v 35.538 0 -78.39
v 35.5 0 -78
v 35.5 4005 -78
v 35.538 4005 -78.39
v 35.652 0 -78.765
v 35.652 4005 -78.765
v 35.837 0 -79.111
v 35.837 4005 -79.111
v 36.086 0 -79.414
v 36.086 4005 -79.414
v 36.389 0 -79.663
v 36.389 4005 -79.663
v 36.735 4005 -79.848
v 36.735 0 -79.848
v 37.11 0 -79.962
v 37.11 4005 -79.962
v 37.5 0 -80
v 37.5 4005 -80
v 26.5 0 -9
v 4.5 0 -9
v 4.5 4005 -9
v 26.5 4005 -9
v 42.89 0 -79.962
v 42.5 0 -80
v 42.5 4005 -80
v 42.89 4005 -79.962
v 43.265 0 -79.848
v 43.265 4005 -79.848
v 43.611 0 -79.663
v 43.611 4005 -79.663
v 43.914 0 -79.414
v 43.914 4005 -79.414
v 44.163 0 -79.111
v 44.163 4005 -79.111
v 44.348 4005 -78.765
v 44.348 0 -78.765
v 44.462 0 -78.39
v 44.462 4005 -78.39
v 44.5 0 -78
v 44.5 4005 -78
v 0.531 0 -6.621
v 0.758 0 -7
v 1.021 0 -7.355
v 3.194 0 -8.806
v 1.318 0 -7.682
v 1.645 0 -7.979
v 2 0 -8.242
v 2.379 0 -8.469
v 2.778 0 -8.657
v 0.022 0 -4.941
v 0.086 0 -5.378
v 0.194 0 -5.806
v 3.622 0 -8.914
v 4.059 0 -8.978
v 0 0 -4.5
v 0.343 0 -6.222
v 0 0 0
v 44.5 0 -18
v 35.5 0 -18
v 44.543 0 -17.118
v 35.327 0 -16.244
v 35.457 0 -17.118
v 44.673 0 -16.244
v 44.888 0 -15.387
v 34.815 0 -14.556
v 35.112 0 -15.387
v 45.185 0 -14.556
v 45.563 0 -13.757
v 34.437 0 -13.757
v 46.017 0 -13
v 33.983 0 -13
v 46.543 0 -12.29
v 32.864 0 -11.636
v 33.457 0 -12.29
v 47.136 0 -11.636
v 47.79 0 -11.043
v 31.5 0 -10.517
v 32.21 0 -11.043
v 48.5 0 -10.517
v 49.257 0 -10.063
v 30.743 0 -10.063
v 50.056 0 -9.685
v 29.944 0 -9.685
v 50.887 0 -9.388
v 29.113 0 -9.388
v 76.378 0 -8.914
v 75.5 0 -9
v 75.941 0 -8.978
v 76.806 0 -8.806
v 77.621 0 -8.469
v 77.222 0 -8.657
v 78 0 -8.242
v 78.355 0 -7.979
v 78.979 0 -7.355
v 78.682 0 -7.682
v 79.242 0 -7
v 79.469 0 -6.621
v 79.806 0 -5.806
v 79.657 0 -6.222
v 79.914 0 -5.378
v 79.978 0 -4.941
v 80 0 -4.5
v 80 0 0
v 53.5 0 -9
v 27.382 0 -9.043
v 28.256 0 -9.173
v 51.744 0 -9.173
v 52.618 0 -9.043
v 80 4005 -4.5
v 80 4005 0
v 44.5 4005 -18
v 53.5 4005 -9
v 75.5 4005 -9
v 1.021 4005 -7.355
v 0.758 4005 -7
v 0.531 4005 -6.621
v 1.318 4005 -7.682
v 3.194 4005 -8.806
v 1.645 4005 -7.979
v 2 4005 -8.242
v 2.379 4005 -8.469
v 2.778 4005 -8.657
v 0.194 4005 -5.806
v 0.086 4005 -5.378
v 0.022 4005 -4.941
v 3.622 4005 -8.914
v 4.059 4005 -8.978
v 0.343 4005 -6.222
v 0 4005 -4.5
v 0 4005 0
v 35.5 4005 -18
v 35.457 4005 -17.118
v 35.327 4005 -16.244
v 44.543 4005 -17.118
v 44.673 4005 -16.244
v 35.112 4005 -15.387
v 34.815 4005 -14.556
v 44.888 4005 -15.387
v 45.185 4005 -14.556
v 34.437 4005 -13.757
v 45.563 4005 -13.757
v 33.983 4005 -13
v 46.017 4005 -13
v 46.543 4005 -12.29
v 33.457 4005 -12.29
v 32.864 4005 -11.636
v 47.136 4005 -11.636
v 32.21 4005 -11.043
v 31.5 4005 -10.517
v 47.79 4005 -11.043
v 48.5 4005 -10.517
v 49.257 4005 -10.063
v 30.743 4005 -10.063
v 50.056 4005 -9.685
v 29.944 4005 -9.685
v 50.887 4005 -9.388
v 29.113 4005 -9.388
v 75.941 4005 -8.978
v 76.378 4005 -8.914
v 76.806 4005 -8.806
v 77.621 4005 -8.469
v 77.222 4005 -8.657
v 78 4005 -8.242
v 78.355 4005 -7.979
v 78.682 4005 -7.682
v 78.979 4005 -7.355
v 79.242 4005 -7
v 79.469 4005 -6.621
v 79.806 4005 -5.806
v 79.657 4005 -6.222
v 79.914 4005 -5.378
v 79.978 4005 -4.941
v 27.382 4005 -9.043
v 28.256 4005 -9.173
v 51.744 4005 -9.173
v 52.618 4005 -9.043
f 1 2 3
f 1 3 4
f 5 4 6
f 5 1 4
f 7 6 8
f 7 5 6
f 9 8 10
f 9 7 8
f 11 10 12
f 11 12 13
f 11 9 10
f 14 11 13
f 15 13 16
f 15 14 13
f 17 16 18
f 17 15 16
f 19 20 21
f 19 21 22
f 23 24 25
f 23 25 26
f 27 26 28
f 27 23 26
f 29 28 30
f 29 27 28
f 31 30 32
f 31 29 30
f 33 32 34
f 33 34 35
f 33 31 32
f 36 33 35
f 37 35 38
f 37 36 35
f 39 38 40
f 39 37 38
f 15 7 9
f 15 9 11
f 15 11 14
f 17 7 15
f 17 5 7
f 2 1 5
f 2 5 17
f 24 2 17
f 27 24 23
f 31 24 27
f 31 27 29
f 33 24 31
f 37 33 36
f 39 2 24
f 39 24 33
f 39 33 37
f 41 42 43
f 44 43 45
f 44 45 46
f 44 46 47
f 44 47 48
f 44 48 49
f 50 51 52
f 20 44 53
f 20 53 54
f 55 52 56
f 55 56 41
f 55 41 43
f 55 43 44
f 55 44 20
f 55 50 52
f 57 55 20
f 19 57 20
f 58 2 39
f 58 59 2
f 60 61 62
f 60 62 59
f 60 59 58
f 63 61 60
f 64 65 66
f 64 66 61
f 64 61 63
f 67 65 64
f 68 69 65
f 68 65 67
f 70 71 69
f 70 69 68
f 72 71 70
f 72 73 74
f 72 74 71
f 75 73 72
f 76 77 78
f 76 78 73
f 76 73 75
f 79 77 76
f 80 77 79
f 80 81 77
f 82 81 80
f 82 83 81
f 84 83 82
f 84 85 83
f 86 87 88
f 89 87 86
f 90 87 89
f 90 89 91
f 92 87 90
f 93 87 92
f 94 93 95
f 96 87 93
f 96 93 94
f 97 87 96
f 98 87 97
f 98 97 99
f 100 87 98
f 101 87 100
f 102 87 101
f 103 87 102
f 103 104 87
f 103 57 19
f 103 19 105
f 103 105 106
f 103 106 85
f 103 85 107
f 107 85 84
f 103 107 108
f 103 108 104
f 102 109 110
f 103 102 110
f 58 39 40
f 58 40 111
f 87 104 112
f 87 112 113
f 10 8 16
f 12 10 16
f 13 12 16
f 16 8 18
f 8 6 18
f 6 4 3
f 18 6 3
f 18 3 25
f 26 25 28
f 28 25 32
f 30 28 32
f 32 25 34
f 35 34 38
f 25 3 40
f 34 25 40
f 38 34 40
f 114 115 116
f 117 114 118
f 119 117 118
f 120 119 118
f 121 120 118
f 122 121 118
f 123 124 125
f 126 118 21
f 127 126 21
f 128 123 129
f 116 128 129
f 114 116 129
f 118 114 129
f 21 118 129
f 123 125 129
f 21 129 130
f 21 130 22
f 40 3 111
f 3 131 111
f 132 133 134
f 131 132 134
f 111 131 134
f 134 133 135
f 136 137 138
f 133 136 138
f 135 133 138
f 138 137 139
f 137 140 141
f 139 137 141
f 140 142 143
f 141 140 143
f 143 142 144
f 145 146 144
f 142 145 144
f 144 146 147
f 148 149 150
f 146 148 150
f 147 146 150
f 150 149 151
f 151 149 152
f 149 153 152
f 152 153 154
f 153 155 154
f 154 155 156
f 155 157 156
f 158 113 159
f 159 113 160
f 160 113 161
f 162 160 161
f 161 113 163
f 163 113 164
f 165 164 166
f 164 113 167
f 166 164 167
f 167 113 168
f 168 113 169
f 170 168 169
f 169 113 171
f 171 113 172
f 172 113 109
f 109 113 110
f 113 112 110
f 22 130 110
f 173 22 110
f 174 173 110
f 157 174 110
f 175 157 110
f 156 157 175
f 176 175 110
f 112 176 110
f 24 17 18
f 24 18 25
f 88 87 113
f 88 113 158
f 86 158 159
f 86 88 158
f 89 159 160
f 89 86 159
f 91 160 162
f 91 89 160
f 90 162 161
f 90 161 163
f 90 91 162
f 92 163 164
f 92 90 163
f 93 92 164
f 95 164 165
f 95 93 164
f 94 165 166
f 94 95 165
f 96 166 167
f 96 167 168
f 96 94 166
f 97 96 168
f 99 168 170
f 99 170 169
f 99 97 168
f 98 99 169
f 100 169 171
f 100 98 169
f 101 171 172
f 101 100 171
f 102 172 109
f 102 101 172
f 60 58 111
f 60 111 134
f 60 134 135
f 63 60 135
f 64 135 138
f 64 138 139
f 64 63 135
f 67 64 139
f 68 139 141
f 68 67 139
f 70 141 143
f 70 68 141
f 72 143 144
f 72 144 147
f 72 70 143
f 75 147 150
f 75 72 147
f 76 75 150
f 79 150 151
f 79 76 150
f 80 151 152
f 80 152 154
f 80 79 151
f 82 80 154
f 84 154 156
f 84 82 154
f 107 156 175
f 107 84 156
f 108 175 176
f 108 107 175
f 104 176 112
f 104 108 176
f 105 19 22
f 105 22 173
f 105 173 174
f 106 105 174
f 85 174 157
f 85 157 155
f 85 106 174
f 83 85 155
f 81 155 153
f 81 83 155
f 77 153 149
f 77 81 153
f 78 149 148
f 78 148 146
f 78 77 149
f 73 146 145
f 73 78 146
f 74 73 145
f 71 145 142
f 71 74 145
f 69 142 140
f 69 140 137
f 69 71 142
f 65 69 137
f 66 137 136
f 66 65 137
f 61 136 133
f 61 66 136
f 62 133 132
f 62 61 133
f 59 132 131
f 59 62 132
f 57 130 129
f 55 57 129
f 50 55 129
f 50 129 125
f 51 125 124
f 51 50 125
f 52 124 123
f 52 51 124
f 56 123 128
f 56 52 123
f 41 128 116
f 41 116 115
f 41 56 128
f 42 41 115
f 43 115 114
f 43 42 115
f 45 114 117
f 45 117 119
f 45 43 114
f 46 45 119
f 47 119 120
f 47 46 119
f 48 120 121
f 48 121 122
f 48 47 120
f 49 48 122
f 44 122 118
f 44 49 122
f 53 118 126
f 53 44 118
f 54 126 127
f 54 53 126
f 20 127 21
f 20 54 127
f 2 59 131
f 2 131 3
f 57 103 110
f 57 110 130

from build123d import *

# Parameters (mm, degrees)
F1_DEPTH = 4005


with BuildPart() as f1:
    # F0 (on Front) → F1 (new body)
    with BuildSketch(Plane.XZ):
        with BuildLine():
            Line((35.5, 0), (0, 0))
            Line((0, 0), (0, -4.5))
            ThreePointArc((0, -4.5), (1.318019, -7.681981), (4.5, -9))
            Line((4.5, -9), (26.5, -9))
            ThreePointArc((26.5, -9), (32.863961, -11.636039), (35.5, -18))
            Line((35.5, -18), (35.5, -78))
            ThreePointArc((35.5, -78), (36.085786, -79.414214), (37.5, -80))
            Line((37.5, -80), (42.5, -80))
            ThreePointArc((42.5, -80), (43.914214, -79.414214), (44.5, -78))
            Line((44.5, -78), (44.5, -18))
            ThreePointArc((44.5, -18), (47.136039, -11.636039), (53.5, -9))
            Line((53.5, -9), (75.5, -9))
            ThreePointArc((75.5, -9), (78.681981, -7.681981), (80, -4.5))
            Line((80, -4.5), (80, 0))
            Line((80, 0), (44.5, 0))
            Line((44.5, 0), (35.5, 0))
        make_face()
    extrude(amount=-F1_DEPTH)


solid = f1.part
